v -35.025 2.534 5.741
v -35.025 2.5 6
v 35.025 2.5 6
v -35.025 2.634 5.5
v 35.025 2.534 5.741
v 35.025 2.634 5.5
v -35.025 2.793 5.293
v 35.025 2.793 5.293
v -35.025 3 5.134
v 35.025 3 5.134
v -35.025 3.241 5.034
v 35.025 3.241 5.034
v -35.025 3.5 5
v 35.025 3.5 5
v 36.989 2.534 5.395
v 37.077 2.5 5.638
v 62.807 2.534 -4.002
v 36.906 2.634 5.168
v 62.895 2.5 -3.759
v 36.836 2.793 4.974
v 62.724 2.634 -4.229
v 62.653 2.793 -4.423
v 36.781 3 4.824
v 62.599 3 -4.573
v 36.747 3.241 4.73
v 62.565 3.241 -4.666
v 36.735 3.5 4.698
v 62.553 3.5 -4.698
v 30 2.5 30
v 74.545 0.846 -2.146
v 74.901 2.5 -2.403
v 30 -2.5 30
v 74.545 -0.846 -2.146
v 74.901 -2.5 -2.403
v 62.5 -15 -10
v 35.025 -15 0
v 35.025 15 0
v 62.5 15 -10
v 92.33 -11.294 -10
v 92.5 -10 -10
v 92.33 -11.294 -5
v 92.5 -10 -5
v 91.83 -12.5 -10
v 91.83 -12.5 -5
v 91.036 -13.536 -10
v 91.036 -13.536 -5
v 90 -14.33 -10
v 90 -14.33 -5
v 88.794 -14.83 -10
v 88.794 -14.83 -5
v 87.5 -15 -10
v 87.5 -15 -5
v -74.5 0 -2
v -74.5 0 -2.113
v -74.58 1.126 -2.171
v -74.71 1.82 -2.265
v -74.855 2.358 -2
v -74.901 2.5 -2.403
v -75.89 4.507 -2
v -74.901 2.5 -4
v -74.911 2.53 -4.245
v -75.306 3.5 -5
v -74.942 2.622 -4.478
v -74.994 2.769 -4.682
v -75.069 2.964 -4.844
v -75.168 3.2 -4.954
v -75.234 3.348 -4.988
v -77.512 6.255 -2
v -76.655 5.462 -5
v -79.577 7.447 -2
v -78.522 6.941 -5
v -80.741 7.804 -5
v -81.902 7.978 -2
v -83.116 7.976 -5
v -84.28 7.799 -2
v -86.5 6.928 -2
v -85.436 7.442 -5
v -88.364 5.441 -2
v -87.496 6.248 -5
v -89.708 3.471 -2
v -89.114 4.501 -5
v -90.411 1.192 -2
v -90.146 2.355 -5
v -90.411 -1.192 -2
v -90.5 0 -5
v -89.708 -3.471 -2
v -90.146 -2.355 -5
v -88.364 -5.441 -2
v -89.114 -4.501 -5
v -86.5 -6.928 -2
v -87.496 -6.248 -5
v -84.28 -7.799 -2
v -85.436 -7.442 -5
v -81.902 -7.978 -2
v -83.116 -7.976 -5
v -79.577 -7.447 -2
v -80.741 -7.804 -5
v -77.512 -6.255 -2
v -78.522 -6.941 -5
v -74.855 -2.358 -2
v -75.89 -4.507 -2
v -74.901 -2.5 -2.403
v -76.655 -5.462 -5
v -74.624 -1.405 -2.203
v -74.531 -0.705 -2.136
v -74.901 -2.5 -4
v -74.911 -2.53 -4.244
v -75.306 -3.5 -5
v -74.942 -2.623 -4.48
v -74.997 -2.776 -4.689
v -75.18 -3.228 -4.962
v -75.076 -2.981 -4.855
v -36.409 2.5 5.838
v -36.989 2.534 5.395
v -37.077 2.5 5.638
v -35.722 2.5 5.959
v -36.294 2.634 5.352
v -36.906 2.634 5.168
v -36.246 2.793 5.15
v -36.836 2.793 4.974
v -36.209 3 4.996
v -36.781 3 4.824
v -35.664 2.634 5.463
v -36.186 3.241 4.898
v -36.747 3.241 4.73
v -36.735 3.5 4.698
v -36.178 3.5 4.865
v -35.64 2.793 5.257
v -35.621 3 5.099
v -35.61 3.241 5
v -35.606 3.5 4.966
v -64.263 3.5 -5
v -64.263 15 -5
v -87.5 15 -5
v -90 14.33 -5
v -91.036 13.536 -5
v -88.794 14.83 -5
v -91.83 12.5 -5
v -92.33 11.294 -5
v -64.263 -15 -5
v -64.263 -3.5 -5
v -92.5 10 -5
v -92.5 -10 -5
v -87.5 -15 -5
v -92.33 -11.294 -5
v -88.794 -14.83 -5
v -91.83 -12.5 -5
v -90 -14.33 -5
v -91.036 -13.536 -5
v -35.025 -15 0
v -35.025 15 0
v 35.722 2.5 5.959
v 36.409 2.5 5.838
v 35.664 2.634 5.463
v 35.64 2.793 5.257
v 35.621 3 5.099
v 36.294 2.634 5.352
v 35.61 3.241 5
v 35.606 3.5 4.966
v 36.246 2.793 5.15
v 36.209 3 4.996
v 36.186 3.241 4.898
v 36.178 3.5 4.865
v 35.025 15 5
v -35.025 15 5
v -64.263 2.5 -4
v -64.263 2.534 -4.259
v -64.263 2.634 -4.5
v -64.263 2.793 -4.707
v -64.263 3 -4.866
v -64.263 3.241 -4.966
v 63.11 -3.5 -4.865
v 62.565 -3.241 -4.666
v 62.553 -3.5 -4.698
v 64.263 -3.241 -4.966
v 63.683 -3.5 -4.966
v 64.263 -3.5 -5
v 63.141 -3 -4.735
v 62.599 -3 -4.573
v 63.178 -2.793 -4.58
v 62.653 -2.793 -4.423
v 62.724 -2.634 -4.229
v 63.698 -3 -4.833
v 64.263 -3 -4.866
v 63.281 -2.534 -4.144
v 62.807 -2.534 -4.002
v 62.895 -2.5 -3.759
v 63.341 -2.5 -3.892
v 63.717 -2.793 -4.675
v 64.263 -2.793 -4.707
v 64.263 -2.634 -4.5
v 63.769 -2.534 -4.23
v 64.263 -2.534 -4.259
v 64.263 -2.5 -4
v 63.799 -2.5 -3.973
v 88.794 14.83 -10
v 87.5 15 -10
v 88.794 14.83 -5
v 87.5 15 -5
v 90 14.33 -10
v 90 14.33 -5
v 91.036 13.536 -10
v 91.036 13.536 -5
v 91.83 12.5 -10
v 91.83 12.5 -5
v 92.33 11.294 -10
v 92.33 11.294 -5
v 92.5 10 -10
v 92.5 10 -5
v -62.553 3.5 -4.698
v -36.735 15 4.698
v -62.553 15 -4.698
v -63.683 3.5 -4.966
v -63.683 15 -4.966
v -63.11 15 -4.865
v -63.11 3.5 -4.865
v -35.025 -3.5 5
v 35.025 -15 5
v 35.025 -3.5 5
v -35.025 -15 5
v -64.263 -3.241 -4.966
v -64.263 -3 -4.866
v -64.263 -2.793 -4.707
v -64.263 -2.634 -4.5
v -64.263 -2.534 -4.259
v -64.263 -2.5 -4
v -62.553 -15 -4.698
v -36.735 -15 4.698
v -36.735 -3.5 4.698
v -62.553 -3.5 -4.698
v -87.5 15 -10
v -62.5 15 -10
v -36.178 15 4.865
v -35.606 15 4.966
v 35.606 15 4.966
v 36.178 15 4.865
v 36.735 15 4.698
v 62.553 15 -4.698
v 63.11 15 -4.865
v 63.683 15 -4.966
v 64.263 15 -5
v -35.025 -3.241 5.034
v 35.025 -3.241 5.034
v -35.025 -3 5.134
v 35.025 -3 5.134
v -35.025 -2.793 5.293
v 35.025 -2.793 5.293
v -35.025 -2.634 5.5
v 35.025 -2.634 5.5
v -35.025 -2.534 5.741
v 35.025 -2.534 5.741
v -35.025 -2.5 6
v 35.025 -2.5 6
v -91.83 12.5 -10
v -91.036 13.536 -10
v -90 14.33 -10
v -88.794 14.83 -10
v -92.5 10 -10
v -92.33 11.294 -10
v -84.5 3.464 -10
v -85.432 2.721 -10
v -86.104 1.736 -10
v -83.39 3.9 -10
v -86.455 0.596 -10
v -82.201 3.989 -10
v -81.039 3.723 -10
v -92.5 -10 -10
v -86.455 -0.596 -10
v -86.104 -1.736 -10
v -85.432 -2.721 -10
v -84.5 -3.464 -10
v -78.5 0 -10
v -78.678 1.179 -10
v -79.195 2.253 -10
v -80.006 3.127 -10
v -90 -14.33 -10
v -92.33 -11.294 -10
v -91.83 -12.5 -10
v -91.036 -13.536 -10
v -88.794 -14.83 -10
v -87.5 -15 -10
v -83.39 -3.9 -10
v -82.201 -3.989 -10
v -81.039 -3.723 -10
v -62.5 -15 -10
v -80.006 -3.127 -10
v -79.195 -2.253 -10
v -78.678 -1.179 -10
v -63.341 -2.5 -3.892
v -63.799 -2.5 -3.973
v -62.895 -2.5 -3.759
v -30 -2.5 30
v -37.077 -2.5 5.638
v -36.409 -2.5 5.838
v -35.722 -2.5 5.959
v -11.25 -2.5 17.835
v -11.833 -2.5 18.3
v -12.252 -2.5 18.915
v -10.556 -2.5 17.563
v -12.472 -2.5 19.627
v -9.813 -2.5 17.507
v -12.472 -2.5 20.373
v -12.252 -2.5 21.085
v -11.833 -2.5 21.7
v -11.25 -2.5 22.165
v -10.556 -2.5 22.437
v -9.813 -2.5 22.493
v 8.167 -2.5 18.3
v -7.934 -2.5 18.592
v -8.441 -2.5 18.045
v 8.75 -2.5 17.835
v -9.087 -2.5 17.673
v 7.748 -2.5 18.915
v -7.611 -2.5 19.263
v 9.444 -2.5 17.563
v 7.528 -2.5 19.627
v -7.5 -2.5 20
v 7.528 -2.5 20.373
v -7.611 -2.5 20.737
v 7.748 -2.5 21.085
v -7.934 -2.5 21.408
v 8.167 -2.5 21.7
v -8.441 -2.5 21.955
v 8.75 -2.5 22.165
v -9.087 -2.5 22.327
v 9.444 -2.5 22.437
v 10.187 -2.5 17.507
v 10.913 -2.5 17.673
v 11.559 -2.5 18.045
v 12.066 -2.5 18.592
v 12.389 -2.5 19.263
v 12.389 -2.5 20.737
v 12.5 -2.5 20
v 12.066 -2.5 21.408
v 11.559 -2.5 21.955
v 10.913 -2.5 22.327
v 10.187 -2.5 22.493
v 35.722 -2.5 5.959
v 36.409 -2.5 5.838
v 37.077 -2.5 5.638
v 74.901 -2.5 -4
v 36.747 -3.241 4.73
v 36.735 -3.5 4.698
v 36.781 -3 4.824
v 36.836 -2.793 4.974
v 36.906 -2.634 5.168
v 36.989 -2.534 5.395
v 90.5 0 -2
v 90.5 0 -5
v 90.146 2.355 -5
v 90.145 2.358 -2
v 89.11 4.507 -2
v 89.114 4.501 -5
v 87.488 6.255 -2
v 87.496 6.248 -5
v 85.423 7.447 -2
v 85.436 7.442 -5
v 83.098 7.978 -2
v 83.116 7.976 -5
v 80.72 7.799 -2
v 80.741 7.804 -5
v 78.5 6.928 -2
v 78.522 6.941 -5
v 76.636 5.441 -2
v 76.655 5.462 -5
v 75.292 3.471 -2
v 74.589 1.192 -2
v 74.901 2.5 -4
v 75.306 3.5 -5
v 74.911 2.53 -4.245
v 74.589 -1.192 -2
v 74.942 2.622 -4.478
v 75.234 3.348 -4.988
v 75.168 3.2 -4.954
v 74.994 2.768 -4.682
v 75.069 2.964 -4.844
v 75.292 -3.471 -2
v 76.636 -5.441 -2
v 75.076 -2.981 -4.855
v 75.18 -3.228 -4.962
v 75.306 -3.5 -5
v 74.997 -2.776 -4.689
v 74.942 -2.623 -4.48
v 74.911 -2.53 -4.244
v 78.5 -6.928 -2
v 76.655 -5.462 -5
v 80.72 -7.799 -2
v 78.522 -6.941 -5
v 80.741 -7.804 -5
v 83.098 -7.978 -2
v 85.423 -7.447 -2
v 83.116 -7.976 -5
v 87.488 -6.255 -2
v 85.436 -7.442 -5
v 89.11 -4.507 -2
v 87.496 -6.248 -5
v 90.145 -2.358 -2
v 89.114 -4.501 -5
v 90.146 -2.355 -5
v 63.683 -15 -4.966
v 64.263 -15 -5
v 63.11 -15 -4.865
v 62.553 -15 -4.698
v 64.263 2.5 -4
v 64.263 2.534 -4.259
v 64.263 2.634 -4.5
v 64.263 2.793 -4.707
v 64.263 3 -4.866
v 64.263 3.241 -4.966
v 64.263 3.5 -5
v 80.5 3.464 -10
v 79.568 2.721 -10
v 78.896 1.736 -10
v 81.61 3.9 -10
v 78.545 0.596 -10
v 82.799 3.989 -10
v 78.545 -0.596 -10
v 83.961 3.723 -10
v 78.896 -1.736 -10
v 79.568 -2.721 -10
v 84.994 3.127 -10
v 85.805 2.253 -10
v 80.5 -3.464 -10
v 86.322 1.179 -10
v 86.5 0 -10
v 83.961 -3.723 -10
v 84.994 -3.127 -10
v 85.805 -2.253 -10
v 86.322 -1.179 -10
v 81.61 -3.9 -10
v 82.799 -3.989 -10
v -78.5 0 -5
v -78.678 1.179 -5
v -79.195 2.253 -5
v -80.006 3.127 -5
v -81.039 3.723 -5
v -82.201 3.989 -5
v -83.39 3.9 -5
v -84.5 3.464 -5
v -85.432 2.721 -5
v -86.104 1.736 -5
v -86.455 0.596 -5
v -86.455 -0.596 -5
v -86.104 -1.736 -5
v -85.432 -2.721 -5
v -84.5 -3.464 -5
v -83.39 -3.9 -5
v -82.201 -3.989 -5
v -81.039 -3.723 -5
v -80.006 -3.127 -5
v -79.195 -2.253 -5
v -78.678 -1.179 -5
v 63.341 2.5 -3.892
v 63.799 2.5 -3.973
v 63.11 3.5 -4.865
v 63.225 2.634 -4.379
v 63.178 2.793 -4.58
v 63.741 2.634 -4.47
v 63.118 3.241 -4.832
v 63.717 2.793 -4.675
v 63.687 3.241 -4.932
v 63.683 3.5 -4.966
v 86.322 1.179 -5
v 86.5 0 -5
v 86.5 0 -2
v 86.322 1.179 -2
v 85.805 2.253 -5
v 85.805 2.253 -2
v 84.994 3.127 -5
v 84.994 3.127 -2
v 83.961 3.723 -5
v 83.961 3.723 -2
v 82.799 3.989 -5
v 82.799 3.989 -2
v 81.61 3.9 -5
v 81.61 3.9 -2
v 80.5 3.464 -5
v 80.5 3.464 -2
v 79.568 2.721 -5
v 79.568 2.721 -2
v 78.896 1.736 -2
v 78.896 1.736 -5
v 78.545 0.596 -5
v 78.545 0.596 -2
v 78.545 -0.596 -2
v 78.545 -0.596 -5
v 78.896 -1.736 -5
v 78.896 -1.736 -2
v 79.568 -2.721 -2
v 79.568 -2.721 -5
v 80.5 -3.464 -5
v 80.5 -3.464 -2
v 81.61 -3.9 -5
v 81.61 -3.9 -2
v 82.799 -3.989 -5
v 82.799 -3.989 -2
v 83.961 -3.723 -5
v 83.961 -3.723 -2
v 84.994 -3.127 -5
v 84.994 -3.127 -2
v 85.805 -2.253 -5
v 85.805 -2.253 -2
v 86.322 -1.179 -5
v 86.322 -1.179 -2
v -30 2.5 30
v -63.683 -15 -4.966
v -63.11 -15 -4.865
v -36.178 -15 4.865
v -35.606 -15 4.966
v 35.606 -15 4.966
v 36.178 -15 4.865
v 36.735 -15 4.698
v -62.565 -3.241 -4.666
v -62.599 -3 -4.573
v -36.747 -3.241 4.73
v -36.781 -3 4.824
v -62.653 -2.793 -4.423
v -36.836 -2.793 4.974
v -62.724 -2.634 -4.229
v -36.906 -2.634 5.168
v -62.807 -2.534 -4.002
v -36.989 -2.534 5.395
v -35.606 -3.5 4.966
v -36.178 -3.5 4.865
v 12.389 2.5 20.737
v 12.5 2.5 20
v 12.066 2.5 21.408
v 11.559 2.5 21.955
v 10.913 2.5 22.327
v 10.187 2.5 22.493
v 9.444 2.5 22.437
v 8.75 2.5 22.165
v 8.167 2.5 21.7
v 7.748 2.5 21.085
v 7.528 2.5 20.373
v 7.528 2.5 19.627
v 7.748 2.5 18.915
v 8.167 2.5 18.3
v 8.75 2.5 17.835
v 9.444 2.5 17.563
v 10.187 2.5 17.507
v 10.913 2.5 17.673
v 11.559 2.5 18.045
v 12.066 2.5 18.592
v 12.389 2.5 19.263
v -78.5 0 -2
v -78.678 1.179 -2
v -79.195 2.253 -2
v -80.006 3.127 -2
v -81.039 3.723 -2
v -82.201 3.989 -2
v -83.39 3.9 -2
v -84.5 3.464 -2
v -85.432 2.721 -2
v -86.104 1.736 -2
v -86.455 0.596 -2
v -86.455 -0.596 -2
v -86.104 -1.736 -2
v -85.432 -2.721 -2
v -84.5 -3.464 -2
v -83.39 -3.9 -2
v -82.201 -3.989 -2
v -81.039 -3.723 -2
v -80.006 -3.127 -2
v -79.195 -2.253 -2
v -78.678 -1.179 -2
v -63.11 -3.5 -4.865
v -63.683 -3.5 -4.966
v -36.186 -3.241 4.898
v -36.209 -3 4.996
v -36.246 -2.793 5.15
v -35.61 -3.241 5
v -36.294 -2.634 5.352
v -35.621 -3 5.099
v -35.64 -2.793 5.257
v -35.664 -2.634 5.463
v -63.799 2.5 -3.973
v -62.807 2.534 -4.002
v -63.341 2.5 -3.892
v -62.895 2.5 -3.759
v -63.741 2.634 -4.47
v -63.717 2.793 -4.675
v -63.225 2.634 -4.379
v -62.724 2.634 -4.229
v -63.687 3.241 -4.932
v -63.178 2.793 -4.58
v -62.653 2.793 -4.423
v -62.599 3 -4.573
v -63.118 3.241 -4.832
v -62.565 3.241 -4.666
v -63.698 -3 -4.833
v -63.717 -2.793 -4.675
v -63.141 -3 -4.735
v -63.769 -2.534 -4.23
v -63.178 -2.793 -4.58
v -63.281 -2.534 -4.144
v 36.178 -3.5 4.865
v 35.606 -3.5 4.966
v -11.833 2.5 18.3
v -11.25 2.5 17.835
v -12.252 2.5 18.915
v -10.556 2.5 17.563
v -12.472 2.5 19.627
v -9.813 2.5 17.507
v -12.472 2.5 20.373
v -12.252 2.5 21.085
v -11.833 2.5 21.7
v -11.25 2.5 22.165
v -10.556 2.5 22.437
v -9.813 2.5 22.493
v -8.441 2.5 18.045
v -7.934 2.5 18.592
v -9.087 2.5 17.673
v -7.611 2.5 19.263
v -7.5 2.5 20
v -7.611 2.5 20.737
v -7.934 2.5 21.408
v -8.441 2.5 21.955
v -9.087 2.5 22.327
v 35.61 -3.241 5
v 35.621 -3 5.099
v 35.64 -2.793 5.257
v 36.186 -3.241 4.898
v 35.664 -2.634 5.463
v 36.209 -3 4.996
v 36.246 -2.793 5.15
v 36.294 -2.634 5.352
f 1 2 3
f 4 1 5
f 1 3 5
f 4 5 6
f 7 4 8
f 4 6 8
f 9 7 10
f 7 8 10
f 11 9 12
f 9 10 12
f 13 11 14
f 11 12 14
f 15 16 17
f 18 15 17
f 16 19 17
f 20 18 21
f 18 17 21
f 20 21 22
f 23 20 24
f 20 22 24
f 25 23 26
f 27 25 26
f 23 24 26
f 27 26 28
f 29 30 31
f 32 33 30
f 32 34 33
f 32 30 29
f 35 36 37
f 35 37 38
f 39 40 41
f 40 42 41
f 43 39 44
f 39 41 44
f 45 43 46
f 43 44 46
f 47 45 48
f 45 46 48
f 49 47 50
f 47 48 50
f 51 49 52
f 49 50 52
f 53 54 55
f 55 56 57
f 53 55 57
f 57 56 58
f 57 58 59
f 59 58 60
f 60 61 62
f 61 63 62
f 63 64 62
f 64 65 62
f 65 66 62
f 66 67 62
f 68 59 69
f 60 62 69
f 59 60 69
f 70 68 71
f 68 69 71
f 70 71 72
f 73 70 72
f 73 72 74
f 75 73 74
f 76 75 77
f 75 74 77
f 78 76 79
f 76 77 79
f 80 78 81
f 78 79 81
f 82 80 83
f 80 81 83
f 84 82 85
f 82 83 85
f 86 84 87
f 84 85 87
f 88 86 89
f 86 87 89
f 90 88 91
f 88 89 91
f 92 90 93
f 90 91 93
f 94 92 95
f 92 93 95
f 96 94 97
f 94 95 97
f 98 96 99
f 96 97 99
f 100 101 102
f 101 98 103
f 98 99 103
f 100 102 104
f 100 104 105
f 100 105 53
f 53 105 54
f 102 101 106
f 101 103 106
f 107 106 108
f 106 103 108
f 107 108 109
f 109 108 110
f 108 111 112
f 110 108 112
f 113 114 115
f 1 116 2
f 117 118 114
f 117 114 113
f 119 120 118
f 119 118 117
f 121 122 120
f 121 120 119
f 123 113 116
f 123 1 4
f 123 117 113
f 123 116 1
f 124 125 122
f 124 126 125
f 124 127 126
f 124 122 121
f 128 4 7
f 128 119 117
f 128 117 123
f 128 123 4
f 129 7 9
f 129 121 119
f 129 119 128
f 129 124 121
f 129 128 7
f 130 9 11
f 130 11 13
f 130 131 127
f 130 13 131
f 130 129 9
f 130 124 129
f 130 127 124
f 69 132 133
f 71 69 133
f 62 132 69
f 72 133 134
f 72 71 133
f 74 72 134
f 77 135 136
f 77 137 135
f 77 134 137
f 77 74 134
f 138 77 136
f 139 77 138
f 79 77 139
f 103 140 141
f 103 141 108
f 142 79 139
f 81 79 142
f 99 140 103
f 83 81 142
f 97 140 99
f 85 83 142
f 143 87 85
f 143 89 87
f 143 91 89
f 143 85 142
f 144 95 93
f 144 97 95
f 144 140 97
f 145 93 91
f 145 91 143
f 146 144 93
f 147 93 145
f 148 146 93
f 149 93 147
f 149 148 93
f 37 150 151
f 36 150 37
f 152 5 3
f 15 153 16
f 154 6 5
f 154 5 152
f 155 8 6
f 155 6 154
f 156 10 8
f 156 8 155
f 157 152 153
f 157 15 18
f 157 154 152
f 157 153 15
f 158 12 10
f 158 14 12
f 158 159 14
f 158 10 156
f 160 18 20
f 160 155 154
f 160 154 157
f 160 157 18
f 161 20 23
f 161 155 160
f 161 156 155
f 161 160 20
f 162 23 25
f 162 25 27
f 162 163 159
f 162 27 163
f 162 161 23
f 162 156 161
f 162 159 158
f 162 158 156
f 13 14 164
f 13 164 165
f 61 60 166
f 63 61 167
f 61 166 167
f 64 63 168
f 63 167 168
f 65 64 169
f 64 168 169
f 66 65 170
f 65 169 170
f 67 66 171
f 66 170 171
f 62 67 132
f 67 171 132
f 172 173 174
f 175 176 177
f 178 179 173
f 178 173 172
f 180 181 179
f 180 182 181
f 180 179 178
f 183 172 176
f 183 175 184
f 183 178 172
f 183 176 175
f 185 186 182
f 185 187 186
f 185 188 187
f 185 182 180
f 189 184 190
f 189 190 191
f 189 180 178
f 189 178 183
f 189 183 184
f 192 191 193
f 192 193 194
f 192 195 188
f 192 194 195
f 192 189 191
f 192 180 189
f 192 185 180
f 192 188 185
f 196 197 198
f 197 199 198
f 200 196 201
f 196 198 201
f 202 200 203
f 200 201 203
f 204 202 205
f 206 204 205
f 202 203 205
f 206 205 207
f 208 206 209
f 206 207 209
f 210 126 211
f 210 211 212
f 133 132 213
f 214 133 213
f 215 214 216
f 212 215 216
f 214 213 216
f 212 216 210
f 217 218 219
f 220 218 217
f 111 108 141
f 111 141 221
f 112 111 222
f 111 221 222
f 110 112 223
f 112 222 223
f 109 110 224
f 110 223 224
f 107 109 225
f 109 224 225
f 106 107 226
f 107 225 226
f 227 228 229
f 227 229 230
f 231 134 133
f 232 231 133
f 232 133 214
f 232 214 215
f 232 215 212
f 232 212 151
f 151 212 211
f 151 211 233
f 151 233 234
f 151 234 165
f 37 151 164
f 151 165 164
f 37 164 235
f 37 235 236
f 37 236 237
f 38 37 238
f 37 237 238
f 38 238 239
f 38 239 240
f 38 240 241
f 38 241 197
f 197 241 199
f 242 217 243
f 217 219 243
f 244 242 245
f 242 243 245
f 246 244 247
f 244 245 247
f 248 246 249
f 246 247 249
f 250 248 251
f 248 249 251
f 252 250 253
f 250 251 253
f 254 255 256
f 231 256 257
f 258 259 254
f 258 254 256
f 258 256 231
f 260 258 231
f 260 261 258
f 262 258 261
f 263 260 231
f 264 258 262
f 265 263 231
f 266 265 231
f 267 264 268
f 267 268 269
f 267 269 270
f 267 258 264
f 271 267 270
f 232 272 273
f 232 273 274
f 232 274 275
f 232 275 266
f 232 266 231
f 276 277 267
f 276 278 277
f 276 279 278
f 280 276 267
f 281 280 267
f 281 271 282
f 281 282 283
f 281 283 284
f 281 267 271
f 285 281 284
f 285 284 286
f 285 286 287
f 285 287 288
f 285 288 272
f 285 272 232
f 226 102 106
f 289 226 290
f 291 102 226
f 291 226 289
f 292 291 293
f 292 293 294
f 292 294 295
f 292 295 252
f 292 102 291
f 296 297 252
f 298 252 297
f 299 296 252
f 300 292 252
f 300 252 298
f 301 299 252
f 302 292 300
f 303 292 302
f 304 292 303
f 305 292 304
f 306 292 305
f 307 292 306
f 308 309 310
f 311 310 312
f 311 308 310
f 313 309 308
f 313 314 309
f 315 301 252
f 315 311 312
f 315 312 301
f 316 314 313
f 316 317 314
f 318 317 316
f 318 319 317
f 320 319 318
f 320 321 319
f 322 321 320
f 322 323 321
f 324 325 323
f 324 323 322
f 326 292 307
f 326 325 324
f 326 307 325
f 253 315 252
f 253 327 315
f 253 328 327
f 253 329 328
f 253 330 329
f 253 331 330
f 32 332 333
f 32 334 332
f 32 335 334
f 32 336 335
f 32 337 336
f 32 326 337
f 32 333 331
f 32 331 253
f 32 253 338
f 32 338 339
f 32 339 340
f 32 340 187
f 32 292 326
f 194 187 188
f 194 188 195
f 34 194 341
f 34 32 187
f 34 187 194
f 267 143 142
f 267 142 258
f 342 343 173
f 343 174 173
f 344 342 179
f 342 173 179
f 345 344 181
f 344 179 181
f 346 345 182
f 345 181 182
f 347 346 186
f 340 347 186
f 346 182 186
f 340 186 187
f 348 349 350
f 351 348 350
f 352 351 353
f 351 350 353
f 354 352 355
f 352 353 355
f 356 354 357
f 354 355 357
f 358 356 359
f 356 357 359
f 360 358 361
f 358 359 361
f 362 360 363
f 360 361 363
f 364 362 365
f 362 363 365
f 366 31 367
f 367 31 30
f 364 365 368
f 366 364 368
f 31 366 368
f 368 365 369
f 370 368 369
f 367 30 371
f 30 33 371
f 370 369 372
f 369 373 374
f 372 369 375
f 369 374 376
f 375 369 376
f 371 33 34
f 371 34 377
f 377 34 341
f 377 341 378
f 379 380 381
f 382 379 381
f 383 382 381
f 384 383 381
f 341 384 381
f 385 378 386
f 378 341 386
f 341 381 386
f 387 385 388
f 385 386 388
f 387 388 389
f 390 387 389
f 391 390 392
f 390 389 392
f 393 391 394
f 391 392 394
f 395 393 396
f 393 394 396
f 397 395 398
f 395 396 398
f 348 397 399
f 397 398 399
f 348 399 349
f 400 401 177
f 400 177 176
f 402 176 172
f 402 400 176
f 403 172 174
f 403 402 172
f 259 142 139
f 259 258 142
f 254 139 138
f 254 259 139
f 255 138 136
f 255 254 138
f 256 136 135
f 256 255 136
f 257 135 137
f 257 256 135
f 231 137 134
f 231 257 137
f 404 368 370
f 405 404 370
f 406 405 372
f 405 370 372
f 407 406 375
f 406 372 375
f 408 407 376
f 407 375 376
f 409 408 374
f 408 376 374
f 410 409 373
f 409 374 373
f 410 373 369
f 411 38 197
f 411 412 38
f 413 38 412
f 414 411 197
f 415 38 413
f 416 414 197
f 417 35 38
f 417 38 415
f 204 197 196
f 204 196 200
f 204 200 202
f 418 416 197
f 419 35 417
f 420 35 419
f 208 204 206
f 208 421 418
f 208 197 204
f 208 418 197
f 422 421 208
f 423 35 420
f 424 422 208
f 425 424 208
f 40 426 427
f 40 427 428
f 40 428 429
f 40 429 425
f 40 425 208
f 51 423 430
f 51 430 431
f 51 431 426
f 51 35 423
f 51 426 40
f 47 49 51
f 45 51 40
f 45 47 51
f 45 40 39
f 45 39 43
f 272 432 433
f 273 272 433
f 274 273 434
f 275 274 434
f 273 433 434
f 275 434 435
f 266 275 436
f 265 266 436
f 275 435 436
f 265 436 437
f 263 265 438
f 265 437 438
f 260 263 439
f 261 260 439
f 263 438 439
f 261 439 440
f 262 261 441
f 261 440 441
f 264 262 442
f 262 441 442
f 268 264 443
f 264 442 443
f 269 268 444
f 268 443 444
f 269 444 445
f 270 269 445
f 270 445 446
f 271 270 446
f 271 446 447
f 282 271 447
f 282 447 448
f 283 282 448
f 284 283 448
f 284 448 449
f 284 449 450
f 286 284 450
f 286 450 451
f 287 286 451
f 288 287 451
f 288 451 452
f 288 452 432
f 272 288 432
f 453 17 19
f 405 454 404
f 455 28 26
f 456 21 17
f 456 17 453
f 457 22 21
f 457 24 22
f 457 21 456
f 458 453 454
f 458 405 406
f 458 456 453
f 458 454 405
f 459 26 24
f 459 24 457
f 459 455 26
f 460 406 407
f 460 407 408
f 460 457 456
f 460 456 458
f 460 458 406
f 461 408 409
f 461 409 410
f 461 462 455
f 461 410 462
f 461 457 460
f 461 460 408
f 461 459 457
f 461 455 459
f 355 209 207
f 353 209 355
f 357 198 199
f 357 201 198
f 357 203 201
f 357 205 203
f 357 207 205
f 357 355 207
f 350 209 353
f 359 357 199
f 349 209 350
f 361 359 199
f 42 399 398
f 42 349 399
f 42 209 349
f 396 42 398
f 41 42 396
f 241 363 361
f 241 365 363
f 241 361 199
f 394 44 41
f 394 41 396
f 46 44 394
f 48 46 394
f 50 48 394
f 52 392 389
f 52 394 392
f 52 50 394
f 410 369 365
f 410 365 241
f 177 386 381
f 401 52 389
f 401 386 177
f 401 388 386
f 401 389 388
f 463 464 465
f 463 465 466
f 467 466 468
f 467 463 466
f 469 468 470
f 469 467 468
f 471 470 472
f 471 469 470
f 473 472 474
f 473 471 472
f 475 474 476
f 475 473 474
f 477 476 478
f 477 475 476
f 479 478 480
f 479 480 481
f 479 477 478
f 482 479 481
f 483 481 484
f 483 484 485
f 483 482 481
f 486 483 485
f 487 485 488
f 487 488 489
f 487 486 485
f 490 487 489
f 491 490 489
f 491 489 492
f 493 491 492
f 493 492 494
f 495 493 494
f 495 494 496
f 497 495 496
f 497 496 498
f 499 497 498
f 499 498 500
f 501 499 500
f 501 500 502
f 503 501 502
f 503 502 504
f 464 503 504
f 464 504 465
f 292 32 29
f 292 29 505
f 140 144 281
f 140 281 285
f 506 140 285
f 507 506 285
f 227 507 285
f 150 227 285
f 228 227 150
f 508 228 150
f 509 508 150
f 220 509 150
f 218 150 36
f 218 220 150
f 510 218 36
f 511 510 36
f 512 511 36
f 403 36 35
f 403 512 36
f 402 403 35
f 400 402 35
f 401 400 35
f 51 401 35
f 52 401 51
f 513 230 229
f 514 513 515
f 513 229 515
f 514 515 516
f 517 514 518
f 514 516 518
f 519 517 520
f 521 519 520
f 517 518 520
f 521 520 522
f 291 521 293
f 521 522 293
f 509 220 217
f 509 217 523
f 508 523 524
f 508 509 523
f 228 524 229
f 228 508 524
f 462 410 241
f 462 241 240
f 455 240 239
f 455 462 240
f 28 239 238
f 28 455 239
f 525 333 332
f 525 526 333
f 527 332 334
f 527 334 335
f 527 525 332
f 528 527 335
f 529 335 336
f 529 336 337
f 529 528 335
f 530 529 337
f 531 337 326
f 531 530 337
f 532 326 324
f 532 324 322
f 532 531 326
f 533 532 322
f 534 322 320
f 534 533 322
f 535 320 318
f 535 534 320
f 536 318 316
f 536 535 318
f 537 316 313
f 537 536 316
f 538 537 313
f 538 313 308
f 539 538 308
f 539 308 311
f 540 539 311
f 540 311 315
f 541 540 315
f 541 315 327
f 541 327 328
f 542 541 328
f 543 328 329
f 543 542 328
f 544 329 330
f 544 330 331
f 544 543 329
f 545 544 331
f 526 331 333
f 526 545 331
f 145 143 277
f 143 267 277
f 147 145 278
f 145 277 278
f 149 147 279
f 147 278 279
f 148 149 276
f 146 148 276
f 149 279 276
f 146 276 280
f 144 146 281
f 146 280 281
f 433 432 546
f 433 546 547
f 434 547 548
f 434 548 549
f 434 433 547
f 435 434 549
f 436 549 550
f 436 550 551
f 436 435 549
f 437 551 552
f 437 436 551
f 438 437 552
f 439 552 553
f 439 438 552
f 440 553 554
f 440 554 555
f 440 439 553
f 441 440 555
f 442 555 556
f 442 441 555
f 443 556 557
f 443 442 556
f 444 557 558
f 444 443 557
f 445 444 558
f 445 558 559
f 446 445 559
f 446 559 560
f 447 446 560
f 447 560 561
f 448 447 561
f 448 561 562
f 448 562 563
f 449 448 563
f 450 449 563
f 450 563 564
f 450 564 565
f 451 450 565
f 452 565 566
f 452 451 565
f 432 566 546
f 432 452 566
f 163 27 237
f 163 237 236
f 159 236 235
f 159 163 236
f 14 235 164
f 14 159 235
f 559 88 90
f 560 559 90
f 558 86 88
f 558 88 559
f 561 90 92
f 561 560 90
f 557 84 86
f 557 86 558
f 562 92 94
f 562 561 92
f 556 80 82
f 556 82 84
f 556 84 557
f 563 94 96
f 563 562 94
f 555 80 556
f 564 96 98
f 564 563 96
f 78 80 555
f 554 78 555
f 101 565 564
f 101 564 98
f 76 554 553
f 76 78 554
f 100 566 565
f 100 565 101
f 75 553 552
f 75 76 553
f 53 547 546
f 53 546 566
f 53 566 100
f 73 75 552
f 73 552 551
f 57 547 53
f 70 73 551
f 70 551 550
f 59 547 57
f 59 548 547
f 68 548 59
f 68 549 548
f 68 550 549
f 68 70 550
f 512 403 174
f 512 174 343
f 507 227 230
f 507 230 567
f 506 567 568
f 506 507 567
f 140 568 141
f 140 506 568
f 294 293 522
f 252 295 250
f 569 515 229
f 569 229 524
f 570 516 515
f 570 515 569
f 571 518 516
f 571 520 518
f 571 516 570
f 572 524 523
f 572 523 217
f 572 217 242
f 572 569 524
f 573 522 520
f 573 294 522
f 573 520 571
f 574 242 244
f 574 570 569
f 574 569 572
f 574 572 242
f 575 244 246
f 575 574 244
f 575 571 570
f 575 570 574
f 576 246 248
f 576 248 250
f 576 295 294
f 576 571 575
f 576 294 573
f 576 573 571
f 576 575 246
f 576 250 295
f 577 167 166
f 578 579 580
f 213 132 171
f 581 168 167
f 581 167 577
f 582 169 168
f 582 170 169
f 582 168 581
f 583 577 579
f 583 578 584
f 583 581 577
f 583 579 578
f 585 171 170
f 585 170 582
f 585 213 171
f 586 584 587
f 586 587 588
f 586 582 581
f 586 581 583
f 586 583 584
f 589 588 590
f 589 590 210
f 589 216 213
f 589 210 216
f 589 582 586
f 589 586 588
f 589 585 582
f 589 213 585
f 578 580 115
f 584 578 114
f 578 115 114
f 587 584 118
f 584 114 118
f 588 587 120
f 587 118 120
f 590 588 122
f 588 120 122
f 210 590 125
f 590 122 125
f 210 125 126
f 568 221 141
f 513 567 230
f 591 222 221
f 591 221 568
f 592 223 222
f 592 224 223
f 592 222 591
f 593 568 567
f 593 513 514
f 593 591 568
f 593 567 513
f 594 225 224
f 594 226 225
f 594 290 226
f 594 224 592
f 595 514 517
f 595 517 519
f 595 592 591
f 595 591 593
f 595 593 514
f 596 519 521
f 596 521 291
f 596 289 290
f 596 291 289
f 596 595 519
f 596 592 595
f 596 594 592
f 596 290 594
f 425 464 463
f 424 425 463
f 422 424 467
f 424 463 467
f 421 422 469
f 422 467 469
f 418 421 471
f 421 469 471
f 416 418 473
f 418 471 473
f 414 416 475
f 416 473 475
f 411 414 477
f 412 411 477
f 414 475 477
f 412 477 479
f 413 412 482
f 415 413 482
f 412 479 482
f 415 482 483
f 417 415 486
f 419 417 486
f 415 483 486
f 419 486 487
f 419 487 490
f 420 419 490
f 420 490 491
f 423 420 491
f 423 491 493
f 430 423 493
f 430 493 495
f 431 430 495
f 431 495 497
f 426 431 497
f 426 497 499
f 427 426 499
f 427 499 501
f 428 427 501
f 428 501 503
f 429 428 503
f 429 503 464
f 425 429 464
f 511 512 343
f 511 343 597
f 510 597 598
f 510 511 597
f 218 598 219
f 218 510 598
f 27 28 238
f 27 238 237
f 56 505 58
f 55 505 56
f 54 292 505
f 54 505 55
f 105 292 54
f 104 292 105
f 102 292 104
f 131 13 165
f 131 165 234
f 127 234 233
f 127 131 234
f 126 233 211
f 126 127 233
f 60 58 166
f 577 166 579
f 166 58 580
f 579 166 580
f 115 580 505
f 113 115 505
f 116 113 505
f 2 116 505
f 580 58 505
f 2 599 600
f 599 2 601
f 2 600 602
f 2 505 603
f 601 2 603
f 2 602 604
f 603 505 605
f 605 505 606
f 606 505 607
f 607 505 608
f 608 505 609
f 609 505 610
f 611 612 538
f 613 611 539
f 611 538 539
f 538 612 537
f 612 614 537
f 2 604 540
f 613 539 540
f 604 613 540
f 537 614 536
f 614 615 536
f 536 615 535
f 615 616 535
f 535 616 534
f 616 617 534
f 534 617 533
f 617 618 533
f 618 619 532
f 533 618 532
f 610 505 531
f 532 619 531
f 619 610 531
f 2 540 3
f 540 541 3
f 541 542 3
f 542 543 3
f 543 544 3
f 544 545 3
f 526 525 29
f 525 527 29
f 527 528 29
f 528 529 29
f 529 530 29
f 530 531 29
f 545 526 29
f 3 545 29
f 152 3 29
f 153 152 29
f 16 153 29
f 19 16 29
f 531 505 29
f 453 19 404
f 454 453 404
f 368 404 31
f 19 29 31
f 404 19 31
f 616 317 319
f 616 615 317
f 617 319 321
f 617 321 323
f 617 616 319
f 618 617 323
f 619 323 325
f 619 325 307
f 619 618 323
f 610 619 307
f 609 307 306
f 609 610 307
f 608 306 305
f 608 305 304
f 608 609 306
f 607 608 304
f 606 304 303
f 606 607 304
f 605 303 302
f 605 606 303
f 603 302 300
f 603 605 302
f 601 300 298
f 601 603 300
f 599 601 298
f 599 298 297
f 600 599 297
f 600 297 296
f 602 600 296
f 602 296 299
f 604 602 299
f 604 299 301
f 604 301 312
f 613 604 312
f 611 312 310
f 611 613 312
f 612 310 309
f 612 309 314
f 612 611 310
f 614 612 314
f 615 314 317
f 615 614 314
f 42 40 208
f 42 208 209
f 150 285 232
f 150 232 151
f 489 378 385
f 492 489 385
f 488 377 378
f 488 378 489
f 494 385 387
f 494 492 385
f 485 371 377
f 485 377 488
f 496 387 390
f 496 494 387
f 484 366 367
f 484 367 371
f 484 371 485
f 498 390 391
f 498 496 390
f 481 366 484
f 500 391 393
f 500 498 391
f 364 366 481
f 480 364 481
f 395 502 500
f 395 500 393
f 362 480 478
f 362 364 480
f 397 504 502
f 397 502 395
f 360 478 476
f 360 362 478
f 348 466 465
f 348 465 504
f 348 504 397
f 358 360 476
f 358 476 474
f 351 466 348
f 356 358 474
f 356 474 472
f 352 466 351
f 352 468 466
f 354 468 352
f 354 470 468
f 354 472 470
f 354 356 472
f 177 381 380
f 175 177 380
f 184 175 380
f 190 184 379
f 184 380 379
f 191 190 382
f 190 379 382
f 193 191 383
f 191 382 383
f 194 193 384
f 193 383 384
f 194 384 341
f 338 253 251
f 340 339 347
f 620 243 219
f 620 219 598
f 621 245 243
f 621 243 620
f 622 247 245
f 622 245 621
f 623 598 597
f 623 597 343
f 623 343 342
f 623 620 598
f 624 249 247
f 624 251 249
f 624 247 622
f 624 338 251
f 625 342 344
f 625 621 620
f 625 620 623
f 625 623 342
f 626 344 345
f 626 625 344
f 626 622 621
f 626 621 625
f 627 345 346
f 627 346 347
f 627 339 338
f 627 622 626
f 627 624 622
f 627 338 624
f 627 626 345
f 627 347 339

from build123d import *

# Parameters (mm, degrees)
F1_DEPTH = 15
F0_R     = 2.5
F3_DEPTH = 2.5
F2_R     = 4
F4_DEPTH = 5.001
F5_R     = 5
F6_R     = 1
F7_R     = 5
F2_R_2   = 8
F8_DEPTH = 3


with BuildPart() as f1:
    # F0 (on Front) → F1 (new body, symmetric)
    with BuildSketch(Plane.XZ):
        Polygon((-35.0252258055, 0), (0, 0), (35.0252258055, 0), (62.5, -10), (92.5, -10), (92.5, -5), (78.5, -5), (63.3816349035, -5), (35.906860709, 5), (0, 5), (-35.906860709, 5), (-63.3816349035, -5), (-78.5, -5), (-92.5, -5), (-92.5, -10), (-62.5, -10), align=None)
    extrude(amount=F1_DEPTH, both=True)

    # F0 (on Front) → F3 (join, symmetric)
    with BuildSketch(Plane.XZ):
        Polygon((-35.0252258055, 0), (0, 0), (35.0252258055, 0), (62.5, -10), (92.5, -10), (92.5, -5), (78.5, -5), (63.3816349035, -5), (35.906860709, 5), (0, 5), (-35.906860709, 5), (-63.3816349035, -5), (-78.5, -5), (-92.5, -5), (-92.5, -10), (-62.5, -10), align=None)
        Polygon((-30, 30), (-78.5, -5), (-63.3816349035, -5), (-35.906860709, 5), (0, 5), (35.906860709, 5), (63.3816349035, -5), (78.5, -5), (30, 30), (0, 30), align=None)
        with Locations((-10, 20)):
            Circle(F0_R, mode=Mode.SUBTRACT)
        with Locations((10, 20)):
            Circle(F0_R, mode=Mode.SUBTRACT)
    extrude(amount=F3_DEPTH, both=True)

    # F2 (on face) → F4 (cut, through all)
    with BuildSketch(Plane.XY.offset(-5)):
        with Locations((-82.5, 0)):
            Circle(F2_R)
        with Locations((82.5, 0)):
            Circle(F2_R)
    extrude(amount=-F4_DEPTH, mode=Mode.SUBTRACT)

    # F5
    f5_edges = [f1.edges().sort_by_distance(p)[0] for p in [
        (-63.381635, -8.75, -5),
        (-63.381635, 8.75, -5),
        (-35.906861, -8.75, 5),
        (-35.906861, 8.75, 5),
        (63.381635, 8.75, -5),
        (63.381635, -8.75, -5),
        (35.906861, -8.75, 5),
        (35.906861, 8.75, 5),
    ]]
    fillet(f5_edges, radius=F5_R)

    # F6
    f6_edges = [f1.edges().sort_by_distance(p)[0] for p in [
        (0, -2.5, 5),
        (0, 2.5, 5),
    ]]
    fillet(f6_edges, radius=F6_R)

    # F7
    f7_edges = [f1.edges().sort_by_distance(p)[0] for p in [
        (-92.5, -15, -7.5),
        (92.5, -15, -7.5),
        (92.5, 15, -7.5),
        (-92.5, 15, -7.5),
    ]]
    fillet(f7_edges, radius=F7_R)

    # F2 (on face) → F8 (join)
    with BuildSketch(Plane.XY.offset(-5)):
        with Locations((-82.5, 0)):
            Circle(F2_R_2)
        with Locations((-82.5, 0)):
            Circle(F2_R, mode=Mode.SUBTRACT)
        with Locations((82.5, 0)):
            Circle(F2_R_2)
        with Locations((82.5, 0)):
            Circle(F2_R, mode=Mode.SUBTRACT)
    extrude(amount=F8_DEPTH)


solid = f1.part
